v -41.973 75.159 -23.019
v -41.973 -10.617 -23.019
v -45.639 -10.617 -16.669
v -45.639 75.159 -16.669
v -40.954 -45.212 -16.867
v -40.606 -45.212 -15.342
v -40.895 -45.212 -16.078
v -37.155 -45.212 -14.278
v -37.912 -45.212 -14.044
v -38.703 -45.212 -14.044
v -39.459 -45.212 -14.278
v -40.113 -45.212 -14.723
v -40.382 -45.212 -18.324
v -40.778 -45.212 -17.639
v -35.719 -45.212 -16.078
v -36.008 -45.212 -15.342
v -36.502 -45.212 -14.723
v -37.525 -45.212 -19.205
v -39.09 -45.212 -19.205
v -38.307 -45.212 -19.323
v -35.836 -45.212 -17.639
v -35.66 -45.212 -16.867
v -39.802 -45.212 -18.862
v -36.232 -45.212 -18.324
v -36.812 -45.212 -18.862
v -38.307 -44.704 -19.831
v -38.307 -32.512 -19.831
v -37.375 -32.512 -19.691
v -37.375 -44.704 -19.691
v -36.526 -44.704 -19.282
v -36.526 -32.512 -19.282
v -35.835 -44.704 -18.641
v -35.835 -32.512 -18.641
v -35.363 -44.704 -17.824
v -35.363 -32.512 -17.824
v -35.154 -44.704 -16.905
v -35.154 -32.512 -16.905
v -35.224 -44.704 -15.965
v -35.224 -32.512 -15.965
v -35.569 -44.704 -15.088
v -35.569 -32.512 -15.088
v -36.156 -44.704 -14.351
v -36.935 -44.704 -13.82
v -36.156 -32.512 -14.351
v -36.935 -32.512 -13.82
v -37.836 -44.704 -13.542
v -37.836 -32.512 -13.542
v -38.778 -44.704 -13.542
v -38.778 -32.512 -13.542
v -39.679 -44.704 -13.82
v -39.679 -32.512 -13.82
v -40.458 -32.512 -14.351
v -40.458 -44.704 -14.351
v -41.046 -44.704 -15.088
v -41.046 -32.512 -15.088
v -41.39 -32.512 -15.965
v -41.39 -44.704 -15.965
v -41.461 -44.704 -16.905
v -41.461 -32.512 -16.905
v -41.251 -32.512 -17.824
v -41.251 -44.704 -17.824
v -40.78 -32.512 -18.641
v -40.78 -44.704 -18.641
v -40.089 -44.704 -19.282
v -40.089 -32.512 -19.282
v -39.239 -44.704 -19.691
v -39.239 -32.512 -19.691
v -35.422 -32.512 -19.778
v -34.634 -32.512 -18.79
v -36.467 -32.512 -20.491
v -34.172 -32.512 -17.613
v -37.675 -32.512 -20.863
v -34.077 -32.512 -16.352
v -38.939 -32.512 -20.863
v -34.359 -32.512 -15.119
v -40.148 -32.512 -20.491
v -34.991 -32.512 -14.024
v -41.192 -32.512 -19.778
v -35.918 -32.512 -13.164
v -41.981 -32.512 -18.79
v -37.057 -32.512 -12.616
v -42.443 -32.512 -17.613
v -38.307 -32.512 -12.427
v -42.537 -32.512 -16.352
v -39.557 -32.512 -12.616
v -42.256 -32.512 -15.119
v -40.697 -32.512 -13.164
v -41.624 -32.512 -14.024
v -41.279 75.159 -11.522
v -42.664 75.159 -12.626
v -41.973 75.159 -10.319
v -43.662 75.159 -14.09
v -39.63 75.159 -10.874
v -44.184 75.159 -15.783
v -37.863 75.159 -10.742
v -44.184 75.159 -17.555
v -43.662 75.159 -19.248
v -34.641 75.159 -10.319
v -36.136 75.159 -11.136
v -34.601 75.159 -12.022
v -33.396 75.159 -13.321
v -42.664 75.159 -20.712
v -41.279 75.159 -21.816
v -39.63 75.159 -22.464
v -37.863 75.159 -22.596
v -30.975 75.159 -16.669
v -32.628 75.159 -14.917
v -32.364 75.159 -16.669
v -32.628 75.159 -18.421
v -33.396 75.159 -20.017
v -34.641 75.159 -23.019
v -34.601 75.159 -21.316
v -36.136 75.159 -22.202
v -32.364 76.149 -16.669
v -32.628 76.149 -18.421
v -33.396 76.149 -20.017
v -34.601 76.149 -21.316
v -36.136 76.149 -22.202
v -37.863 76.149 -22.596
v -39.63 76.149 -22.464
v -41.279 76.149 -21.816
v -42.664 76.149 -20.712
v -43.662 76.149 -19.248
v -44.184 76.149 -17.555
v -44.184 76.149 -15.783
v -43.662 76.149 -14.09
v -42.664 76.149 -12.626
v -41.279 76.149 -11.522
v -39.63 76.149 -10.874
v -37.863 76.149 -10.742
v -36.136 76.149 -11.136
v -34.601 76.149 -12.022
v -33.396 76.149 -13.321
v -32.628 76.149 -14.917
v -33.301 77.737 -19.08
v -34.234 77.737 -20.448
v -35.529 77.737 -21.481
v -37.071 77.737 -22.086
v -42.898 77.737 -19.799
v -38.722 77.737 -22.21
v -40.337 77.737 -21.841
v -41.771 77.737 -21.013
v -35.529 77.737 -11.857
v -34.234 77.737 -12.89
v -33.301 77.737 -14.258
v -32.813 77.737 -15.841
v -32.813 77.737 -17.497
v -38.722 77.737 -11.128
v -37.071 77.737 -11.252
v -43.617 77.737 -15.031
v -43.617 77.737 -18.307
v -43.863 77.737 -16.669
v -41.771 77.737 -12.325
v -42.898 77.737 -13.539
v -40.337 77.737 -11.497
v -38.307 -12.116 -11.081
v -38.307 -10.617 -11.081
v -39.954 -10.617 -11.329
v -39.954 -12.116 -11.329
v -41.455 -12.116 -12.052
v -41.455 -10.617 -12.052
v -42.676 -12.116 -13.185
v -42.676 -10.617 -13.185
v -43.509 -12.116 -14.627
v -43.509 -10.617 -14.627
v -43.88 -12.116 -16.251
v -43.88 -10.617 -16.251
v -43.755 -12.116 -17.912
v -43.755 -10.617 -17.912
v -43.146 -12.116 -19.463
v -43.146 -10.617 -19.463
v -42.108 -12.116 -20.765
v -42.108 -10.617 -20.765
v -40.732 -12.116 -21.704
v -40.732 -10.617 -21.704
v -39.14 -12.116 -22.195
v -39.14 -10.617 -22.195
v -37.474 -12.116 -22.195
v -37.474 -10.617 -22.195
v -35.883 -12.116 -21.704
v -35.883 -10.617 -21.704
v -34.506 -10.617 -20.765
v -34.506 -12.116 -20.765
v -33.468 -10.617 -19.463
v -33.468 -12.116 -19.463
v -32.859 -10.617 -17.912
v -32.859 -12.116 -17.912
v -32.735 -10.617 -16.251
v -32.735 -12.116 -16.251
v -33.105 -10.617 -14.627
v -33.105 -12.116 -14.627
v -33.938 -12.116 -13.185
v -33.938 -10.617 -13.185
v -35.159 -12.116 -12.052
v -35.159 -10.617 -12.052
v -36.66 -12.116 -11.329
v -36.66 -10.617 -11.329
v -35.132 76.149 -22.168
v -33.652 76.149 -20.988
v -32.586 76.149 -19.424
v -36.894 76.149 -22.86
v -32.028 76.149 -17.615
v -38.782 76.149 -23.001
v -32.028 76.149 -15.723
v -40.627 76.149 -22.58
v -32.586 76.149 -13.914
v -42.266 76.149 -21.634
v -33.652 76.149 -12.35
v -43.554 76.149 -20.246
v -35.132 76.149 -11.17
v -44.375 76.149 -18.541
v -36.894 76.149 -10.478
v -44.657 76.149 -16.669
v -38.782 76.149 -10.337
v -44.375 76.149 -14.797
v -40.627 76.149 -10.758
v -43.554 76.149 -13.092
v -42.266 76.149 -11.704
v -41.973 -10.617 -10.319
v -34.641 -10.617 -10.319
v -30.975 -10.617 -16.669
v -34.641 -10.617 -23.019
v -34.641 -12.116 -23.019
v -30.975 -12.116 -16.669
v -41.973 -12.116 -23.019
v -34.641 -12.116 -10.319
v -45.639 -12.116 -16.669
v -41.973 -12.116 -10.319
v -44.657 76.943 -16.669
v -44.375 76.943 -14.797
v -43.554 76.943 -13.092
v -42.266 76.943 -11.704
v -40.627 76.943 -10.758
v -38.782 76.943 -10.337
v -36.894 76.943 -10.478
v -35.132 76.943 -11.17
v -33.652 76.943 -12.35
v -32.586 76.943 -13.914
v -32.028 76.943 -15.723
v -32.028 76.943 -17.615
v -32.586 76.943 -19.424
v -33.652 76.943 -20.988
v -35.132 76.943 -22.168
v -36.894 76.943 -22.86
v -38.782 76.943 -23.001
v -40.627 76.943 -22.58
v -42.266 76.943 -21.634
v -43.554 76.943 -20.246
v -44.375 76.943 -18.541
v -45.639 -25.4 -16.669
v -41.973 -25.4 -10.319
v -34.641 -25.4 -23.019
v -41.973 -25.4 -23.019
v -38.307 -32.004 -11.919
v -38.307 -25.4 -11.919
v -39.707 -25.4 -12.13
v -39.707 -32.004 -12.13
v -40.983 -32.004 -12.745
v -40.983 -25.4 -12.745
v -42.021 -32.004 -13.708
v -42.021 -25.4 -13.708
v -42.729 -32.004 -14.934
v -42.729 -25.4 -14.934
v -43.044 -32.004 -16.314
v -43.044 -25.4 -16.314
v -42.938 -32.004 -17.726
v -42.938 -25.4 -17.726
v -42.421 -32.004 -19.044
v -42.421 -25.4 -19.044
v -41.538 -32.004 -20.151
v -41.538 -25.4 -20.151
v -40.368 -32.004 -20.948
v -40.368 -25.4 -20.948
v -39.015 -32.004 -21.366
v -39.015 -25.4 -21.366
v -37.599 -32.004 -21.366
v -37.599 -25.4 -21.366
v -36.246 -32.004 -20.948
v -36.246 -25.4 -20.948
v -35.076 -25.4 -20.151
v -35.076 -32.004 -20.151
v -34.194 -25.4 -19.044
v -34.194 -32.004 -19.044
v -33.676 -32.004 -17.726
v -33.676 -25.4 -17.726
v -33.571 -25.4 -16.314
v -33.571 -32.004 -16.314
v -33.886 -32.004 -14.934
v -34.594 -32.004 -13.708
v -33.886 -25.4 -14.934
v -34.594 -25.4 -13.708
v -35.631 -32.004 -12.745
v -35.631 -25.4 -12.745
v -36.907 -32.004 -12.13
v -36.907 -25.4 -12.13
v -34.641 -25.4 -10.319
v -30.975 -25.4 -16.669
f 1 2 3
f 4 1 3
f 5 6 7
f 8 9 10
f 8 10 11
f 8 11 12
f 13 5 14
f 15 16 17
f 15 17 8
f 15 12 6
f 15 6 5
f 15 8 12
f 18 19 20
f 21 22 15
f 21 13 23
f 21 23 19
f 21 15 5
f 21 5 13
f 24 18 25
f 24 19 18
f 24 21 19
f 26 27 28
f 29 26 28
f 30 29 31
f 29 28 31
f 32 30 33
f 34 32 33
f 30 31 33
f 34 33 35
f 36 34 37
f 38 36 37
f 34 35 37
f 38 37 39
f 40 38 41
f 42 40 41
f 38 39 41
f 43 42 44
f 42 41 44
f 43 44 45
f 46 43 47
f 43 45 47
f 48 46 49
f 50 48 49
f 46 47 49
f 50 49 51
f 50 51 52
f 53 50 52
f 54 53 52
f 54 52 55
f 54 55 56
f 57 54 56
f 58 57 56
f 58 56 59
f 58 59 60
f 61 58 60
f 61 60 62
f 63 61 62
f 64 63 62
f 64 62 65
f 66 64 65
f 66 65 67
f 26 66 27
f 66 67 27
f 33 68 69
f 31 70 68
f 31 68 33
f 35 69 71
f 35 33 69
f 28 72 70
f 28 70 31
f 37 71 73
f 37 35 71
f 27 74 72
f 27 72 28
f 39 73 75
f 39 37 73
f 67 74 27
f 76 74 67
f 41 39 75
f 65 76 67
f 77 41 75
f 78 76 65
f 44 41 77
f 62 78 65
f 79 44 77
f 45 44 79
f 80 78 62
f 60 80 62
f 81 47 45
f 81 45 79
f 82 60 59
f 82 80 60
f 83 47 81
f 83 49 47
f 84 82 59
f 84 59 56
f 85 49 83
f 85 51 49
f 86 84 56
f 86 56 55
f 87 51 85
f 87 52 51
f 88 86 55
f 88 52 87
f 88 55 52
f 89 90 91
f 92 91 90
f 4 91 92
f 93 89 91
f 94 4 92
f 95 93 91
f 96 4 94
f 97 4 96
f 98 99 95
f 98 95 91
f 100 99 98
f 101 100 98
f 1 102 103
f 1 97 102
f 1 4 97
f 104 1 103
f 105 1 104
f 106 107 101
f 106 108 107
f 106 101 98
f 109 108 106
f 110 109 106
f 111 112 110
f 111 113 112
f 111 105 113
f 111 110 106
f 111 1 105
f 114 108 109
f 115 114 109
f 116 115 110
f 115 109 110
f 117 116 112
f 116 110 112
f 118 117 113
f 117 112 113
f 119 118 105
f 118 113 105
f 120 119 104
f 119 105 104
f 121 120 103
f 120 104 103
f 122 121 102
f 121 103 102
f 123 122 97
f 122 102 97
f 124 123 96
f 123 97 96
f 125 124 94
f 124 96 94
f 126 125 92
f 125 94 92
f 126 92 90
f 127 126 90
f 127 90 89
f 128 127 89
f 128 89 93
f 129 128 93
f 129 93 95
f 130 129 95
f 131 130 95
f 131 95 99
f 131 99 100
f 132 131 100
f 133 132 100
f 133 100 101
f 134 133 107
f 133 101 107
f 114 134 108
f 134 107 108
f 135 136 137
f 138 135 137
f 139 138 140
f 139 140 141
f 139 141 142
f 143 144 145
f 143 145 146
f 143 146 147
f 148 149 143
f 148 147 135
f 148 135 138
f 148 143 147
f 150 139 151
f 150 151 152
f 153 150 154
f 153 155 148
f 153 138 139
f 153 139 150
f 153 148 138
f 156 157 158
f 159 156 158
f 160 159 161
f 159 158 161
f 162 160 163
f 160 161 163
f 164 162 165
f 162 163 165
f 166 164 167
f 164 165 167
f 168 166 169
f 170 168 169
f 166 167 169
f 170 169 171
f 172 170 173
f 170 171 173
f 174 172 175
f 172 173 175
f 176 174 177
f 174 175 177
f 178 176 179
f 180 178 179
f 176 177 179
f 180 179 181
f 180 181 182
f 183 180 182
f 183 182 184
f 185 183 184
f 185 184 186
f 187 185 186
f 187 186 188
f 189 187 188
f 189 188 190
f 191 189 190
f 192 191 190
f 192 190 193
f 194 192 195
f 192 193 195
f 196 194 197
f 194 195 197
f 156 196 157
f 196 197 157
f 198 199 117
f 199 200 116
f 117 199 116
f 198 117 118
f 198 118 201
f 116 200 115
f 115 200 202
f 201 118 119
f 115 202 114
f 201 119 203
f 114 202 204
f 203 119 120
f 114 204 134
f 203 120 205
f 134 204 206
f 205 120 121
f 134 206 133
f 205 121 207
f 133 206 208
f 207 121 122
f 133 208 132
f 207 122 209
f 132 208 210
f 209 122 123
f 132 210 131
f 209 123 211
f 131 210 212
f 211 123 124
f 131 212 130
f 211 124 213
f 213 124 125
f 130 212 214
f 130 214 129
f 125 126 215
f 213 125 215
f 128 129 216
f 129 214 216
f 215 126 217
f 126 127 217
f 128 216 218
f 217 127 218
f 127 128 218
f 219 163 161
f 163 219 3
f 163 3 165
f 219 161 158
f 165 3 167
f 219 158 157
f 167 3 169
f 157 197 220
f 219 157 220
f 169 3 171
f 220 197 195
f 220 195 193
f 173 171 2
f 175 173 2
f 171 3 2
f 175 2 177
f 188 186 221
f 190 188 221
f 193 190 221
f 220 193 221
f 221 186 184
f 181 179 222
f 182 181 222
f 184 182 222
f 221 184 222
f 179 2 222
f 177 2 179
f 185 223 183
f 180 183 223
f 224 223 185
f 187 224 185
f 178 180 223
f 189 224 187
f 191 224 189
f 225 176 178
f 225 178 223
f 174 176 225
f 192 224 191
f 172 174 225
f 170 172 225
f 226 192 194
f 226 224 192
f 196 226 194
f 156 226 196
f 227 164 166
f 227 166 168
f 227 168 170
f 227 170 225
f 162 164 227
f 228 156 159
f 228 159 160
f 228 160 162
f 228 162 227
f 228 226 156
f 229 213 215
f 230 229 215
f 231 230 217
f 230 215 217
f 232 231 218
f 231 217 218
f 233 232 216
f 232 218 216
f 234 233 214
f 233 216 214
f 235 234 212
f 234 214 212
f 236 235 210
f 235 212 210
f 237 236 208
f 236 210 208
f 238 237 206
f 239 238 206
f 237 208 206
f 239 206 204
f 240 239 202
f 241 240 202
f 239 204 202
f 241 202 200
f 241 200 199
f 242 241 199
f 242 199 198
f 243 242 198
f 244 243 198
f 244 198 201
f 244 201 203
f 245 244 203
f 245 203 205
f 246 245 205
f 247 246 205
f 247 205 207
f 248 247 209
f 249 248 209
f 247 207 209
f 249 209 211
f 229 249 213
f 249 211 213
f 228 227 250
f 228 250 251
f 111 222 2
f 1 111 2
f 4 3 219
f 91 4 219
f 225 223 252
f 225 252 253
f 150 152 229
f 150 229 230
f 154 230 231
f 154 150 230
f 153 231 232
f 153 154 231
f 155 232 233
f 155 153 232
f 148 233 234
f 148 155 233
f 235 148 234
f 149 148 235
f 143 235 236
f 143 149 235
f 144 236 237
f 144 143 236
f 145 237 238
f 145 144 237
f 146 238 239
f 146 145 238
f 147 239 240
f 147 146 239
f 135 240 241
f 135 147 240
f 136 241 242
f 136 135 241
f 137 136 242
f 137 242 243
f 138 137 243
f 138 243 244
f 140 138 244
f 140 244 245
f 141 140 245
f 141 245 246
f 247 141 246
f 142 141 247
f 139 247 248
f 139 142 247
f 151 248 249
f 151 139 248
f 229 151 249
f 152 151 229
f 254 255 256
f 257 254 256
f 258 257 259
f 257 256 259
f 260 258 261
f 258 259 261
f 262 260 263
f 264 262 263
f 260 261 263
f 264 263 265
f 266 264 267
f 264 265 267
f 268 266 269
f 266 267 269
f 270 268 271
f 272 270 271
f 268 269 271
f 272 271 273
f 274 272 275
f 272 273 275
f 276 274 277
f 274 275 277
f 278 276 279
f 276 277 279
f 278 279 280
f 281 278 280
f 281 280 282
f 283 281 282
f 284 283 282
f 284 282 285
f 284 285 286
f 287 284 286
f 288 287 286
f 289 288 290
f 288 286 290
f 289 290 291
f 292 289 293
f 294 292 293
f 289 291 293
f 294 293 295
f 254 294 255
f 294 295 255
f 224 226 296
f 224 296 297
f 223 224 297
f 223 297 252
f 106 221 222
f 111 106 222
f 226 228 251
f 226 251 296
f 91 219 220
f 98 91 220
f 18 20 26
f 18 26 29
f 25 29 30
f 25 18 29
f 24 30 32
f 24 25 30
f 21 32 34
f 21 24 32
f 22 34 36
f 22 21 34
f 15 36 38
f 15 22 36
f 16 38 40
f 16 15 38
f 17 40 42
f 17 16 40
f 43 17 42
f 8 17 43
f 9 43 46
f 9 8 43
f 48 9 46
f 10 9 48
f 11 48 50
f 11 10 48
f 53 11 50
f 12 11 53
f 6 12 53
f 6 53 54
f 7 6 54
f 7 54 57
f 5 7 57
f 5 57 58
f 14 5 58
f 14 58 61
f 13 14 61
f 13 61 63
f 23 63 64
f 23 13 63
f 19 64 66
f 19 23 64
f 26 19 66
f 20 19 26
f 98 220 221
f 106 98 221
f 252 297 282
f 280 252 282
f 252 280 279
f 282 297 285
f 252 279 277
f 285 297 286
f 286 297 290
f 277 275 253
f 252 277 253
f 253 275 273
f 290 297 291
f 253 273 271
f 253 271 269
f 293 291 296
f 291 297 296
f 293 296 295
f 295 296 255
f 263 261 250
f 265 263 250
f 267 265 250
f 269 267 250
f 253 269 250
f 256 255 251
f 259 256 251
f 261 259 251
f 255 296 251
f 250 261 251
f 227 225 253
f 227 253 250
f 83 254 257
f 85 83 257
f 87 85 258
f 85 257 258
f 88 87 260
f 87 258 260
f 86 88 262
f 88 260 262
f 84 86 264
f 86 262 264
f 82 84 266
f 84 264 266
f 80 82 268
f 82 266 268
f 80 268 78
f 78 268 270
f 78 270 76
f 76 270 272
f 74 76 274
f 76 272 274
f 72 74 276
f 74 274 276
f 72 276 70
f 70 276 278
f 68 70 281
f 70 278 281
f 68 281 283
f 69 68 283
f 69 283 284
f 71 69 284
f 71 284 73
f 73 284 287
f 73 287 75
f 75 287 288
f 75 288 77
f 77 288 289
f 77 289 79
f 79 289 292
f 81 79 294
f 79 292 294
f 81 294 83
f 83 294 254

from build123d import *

# Parameters (mm, degrees)
BOSS_EXTRUDE1_DEPTH = 10.6172
SKETCH2_R           = 5.588
BOSS_EXTRUDE2_DEPTH = 1.4986
BOSS_EXTRUDE3_DEPTH = 13.2842
SKETCH4_R           = 4.7498
BOSS_EXTRUDE4_DEPTH = 7.112
BOSS_EXTRUDE7_DEPTH = 134.62
SKETCH5_R           = 3.1623
BOSS_EXTRUDE5_DEPTH = 12.7
CHAMFER1_SIZE       = 0.508
CHAMFER2_SIZE       = 0.508
CUT_EXTRUDE2_START  = -59.4614
CUT_EXTRUDE2_DEPTH  = 59.4614
SKETCH12_R          = 5.9436
BOSS_EXTRUDE8_DEPTH = 0.9906
SKETCH13_R          = 6.35
BOSS_EXTRUDE9_DEPTH = 1.5875
CHAMFER3_SIZE       = 0.79375


with BuildPart() as part:
    # Sketch1 → Boss-Extrude1 (new body)
    with BuildSketch(Plane(origin=(0, 0, 0), x_dir=(1, 0, 0), z_dir=(0, 1, 0))):
        Polygon((-34.640959507, 23.019011646), (-41.973307925, 23.019011646), (-45.639482135, 16.669011646), (-41.973307925, 10.319011646), (-34.640959507, 10.319011646), (-30.974785297, 16.669011646), align=None)
    extrude(amount=-BOSS_EXTRUDE1_DEPTH)

    # Sketch2 → Boss-Extrude2 (add)
    with BuildSketch(Plane.XZ.offset(10.6172)):
        with Locations(Location((-38.307133716, -16.669011646, 0), (0, 0, 90))):
            Circle(SKETCH2_R)
    extrude(amount=BOSS_EXTRUDE2_DEPTH)

    # Sketch3 → Boss-Extrude3 (add)
    with BuildSketch(Plane(origin=(0, -12.1158, 0), x_dir=(-1, 0, 0), z_dir=(0, 1, 0))):
        Polygon((41.973307925, -23.019011646), (45.639482135, -16.669011646), (41.973307925, -10.319011646), (34.640959507, -10.319011646), (30.974785297, -16.669011646), (34.640959507, -23.019011646), align=None)
    extrude(amount=-BOSS_EXTRUDE3_DEPTH)

    # Sketch4 → Boss-Extrude4 (add)
    with BuildSketch(Plane.XZ.offset(25.4)):
        with Locations(Location((-38.307133716, -16.669011646, 0), (0, 0, 90))):
            Circle(SKETCH4_R)
    extrude(amount=BOSS_EXTRUDE4_DEPTH)

    # Sketch10 → Boss-Extrude7 (add)
    with BuildSketch(Plane(origin=(0, 0, 0), x_dir=(1, 0, 0), z_dir=(0, 1, 0))):
        Polygon((-30.974785297, 16.669011646), (-34.640959507, 23.019011646), (-41.973307925, 23.019011646), (-45.639482135, 16.669011646), (-41.973307925, 10.319011646), (-34.640959507, 10.319011646), align=None)
    extrude(amount=BOSS_EXTRUDE7_DEPTH)

    # Sketch5 → Boss-Extrude5 (add)
    with BuildSketch(Plane.XZ.offset(32.512)):
        with Locations(Location((-38.307133716, -16.669011646, 0), (0, 0, 270))):
            Circle(SKETCH5_R)
    extrude(amount=BOSS_EXTRUDE5_DEPTH)

    # Chamfer1
    chamfer1_edges = [part.edges().sort_by_distance(p)[0] for p in [
        (-38.307133716, -45.212, -13.506711646),
    ]]
    chamfer(chamfer1_edges, length=CHAMFER1_SIZE)

    # Chamfer2
    chamfer2_edges = [part.edges().sort_by_distance(p)[0] for p in [
        (-38.307133716, -32.512, -21.418811646),
    ]]
    chamfer(chamfer2_edges, length=CHAMFER2_SIZE)

    # Sketch11 → Cut-Extrude2 (cut)
    with BuildSketch(Plane(origin=(0, 134.62, 0), x_dir=(1, 0, 0), z_dir=(0, 1, 0)).offset(CUT_EXTRUDE2_START)):
        Polygon((-34.640959507, 10.319011646), (-30.974785297, 16.669011646), (-34.640959507, 23.019011646), (-41.973307925, 23.019011646), (-45.639482135, 16.669011646), (-41.973307925, 10.319011646), align=None)
    extrude(amount=CUT_EXTRUDE2_DEPTH, mode=Mode.SUBTRACT)

    # Sketch12 → Boss-Extrude8 (add)
    with BuildSketch(Plane(origin=(0, 75.1586, 0), x_dir=(1, 0, 0), z_dir=(0, 1, 0))):
        with Locations((-38.307133716, 16.669011646)):
            Circle(SKETCH12_R)
    extrude(amount=BOSS_EXTRUDE8_DEPTH)

    # Sketch13 → Boss-Extrude9 (add)
    with BuildSketch(Plane(origin=(0, 76.1492, 0), x_dir=(1, 0, 0), z_dir=(0, 1, 0))):
        with Locations(Location((-38.307133716, 16.669011646, 0), (0, 0, 180))):
            Circle(SKETCH13_R)
    extrude(amount=BOSS_EXTRUDE9_DEPTH)

    # Chamfer3
    chamfer3_edges = [part.edges().sort_by_distance(p)[0] for p in [
        (-31.957133716, 77.7367, -16.669011646),
    ]]
    chamfer(chamfer3_edges, length=CHAMFER3_SIZE)


solid = part.part
